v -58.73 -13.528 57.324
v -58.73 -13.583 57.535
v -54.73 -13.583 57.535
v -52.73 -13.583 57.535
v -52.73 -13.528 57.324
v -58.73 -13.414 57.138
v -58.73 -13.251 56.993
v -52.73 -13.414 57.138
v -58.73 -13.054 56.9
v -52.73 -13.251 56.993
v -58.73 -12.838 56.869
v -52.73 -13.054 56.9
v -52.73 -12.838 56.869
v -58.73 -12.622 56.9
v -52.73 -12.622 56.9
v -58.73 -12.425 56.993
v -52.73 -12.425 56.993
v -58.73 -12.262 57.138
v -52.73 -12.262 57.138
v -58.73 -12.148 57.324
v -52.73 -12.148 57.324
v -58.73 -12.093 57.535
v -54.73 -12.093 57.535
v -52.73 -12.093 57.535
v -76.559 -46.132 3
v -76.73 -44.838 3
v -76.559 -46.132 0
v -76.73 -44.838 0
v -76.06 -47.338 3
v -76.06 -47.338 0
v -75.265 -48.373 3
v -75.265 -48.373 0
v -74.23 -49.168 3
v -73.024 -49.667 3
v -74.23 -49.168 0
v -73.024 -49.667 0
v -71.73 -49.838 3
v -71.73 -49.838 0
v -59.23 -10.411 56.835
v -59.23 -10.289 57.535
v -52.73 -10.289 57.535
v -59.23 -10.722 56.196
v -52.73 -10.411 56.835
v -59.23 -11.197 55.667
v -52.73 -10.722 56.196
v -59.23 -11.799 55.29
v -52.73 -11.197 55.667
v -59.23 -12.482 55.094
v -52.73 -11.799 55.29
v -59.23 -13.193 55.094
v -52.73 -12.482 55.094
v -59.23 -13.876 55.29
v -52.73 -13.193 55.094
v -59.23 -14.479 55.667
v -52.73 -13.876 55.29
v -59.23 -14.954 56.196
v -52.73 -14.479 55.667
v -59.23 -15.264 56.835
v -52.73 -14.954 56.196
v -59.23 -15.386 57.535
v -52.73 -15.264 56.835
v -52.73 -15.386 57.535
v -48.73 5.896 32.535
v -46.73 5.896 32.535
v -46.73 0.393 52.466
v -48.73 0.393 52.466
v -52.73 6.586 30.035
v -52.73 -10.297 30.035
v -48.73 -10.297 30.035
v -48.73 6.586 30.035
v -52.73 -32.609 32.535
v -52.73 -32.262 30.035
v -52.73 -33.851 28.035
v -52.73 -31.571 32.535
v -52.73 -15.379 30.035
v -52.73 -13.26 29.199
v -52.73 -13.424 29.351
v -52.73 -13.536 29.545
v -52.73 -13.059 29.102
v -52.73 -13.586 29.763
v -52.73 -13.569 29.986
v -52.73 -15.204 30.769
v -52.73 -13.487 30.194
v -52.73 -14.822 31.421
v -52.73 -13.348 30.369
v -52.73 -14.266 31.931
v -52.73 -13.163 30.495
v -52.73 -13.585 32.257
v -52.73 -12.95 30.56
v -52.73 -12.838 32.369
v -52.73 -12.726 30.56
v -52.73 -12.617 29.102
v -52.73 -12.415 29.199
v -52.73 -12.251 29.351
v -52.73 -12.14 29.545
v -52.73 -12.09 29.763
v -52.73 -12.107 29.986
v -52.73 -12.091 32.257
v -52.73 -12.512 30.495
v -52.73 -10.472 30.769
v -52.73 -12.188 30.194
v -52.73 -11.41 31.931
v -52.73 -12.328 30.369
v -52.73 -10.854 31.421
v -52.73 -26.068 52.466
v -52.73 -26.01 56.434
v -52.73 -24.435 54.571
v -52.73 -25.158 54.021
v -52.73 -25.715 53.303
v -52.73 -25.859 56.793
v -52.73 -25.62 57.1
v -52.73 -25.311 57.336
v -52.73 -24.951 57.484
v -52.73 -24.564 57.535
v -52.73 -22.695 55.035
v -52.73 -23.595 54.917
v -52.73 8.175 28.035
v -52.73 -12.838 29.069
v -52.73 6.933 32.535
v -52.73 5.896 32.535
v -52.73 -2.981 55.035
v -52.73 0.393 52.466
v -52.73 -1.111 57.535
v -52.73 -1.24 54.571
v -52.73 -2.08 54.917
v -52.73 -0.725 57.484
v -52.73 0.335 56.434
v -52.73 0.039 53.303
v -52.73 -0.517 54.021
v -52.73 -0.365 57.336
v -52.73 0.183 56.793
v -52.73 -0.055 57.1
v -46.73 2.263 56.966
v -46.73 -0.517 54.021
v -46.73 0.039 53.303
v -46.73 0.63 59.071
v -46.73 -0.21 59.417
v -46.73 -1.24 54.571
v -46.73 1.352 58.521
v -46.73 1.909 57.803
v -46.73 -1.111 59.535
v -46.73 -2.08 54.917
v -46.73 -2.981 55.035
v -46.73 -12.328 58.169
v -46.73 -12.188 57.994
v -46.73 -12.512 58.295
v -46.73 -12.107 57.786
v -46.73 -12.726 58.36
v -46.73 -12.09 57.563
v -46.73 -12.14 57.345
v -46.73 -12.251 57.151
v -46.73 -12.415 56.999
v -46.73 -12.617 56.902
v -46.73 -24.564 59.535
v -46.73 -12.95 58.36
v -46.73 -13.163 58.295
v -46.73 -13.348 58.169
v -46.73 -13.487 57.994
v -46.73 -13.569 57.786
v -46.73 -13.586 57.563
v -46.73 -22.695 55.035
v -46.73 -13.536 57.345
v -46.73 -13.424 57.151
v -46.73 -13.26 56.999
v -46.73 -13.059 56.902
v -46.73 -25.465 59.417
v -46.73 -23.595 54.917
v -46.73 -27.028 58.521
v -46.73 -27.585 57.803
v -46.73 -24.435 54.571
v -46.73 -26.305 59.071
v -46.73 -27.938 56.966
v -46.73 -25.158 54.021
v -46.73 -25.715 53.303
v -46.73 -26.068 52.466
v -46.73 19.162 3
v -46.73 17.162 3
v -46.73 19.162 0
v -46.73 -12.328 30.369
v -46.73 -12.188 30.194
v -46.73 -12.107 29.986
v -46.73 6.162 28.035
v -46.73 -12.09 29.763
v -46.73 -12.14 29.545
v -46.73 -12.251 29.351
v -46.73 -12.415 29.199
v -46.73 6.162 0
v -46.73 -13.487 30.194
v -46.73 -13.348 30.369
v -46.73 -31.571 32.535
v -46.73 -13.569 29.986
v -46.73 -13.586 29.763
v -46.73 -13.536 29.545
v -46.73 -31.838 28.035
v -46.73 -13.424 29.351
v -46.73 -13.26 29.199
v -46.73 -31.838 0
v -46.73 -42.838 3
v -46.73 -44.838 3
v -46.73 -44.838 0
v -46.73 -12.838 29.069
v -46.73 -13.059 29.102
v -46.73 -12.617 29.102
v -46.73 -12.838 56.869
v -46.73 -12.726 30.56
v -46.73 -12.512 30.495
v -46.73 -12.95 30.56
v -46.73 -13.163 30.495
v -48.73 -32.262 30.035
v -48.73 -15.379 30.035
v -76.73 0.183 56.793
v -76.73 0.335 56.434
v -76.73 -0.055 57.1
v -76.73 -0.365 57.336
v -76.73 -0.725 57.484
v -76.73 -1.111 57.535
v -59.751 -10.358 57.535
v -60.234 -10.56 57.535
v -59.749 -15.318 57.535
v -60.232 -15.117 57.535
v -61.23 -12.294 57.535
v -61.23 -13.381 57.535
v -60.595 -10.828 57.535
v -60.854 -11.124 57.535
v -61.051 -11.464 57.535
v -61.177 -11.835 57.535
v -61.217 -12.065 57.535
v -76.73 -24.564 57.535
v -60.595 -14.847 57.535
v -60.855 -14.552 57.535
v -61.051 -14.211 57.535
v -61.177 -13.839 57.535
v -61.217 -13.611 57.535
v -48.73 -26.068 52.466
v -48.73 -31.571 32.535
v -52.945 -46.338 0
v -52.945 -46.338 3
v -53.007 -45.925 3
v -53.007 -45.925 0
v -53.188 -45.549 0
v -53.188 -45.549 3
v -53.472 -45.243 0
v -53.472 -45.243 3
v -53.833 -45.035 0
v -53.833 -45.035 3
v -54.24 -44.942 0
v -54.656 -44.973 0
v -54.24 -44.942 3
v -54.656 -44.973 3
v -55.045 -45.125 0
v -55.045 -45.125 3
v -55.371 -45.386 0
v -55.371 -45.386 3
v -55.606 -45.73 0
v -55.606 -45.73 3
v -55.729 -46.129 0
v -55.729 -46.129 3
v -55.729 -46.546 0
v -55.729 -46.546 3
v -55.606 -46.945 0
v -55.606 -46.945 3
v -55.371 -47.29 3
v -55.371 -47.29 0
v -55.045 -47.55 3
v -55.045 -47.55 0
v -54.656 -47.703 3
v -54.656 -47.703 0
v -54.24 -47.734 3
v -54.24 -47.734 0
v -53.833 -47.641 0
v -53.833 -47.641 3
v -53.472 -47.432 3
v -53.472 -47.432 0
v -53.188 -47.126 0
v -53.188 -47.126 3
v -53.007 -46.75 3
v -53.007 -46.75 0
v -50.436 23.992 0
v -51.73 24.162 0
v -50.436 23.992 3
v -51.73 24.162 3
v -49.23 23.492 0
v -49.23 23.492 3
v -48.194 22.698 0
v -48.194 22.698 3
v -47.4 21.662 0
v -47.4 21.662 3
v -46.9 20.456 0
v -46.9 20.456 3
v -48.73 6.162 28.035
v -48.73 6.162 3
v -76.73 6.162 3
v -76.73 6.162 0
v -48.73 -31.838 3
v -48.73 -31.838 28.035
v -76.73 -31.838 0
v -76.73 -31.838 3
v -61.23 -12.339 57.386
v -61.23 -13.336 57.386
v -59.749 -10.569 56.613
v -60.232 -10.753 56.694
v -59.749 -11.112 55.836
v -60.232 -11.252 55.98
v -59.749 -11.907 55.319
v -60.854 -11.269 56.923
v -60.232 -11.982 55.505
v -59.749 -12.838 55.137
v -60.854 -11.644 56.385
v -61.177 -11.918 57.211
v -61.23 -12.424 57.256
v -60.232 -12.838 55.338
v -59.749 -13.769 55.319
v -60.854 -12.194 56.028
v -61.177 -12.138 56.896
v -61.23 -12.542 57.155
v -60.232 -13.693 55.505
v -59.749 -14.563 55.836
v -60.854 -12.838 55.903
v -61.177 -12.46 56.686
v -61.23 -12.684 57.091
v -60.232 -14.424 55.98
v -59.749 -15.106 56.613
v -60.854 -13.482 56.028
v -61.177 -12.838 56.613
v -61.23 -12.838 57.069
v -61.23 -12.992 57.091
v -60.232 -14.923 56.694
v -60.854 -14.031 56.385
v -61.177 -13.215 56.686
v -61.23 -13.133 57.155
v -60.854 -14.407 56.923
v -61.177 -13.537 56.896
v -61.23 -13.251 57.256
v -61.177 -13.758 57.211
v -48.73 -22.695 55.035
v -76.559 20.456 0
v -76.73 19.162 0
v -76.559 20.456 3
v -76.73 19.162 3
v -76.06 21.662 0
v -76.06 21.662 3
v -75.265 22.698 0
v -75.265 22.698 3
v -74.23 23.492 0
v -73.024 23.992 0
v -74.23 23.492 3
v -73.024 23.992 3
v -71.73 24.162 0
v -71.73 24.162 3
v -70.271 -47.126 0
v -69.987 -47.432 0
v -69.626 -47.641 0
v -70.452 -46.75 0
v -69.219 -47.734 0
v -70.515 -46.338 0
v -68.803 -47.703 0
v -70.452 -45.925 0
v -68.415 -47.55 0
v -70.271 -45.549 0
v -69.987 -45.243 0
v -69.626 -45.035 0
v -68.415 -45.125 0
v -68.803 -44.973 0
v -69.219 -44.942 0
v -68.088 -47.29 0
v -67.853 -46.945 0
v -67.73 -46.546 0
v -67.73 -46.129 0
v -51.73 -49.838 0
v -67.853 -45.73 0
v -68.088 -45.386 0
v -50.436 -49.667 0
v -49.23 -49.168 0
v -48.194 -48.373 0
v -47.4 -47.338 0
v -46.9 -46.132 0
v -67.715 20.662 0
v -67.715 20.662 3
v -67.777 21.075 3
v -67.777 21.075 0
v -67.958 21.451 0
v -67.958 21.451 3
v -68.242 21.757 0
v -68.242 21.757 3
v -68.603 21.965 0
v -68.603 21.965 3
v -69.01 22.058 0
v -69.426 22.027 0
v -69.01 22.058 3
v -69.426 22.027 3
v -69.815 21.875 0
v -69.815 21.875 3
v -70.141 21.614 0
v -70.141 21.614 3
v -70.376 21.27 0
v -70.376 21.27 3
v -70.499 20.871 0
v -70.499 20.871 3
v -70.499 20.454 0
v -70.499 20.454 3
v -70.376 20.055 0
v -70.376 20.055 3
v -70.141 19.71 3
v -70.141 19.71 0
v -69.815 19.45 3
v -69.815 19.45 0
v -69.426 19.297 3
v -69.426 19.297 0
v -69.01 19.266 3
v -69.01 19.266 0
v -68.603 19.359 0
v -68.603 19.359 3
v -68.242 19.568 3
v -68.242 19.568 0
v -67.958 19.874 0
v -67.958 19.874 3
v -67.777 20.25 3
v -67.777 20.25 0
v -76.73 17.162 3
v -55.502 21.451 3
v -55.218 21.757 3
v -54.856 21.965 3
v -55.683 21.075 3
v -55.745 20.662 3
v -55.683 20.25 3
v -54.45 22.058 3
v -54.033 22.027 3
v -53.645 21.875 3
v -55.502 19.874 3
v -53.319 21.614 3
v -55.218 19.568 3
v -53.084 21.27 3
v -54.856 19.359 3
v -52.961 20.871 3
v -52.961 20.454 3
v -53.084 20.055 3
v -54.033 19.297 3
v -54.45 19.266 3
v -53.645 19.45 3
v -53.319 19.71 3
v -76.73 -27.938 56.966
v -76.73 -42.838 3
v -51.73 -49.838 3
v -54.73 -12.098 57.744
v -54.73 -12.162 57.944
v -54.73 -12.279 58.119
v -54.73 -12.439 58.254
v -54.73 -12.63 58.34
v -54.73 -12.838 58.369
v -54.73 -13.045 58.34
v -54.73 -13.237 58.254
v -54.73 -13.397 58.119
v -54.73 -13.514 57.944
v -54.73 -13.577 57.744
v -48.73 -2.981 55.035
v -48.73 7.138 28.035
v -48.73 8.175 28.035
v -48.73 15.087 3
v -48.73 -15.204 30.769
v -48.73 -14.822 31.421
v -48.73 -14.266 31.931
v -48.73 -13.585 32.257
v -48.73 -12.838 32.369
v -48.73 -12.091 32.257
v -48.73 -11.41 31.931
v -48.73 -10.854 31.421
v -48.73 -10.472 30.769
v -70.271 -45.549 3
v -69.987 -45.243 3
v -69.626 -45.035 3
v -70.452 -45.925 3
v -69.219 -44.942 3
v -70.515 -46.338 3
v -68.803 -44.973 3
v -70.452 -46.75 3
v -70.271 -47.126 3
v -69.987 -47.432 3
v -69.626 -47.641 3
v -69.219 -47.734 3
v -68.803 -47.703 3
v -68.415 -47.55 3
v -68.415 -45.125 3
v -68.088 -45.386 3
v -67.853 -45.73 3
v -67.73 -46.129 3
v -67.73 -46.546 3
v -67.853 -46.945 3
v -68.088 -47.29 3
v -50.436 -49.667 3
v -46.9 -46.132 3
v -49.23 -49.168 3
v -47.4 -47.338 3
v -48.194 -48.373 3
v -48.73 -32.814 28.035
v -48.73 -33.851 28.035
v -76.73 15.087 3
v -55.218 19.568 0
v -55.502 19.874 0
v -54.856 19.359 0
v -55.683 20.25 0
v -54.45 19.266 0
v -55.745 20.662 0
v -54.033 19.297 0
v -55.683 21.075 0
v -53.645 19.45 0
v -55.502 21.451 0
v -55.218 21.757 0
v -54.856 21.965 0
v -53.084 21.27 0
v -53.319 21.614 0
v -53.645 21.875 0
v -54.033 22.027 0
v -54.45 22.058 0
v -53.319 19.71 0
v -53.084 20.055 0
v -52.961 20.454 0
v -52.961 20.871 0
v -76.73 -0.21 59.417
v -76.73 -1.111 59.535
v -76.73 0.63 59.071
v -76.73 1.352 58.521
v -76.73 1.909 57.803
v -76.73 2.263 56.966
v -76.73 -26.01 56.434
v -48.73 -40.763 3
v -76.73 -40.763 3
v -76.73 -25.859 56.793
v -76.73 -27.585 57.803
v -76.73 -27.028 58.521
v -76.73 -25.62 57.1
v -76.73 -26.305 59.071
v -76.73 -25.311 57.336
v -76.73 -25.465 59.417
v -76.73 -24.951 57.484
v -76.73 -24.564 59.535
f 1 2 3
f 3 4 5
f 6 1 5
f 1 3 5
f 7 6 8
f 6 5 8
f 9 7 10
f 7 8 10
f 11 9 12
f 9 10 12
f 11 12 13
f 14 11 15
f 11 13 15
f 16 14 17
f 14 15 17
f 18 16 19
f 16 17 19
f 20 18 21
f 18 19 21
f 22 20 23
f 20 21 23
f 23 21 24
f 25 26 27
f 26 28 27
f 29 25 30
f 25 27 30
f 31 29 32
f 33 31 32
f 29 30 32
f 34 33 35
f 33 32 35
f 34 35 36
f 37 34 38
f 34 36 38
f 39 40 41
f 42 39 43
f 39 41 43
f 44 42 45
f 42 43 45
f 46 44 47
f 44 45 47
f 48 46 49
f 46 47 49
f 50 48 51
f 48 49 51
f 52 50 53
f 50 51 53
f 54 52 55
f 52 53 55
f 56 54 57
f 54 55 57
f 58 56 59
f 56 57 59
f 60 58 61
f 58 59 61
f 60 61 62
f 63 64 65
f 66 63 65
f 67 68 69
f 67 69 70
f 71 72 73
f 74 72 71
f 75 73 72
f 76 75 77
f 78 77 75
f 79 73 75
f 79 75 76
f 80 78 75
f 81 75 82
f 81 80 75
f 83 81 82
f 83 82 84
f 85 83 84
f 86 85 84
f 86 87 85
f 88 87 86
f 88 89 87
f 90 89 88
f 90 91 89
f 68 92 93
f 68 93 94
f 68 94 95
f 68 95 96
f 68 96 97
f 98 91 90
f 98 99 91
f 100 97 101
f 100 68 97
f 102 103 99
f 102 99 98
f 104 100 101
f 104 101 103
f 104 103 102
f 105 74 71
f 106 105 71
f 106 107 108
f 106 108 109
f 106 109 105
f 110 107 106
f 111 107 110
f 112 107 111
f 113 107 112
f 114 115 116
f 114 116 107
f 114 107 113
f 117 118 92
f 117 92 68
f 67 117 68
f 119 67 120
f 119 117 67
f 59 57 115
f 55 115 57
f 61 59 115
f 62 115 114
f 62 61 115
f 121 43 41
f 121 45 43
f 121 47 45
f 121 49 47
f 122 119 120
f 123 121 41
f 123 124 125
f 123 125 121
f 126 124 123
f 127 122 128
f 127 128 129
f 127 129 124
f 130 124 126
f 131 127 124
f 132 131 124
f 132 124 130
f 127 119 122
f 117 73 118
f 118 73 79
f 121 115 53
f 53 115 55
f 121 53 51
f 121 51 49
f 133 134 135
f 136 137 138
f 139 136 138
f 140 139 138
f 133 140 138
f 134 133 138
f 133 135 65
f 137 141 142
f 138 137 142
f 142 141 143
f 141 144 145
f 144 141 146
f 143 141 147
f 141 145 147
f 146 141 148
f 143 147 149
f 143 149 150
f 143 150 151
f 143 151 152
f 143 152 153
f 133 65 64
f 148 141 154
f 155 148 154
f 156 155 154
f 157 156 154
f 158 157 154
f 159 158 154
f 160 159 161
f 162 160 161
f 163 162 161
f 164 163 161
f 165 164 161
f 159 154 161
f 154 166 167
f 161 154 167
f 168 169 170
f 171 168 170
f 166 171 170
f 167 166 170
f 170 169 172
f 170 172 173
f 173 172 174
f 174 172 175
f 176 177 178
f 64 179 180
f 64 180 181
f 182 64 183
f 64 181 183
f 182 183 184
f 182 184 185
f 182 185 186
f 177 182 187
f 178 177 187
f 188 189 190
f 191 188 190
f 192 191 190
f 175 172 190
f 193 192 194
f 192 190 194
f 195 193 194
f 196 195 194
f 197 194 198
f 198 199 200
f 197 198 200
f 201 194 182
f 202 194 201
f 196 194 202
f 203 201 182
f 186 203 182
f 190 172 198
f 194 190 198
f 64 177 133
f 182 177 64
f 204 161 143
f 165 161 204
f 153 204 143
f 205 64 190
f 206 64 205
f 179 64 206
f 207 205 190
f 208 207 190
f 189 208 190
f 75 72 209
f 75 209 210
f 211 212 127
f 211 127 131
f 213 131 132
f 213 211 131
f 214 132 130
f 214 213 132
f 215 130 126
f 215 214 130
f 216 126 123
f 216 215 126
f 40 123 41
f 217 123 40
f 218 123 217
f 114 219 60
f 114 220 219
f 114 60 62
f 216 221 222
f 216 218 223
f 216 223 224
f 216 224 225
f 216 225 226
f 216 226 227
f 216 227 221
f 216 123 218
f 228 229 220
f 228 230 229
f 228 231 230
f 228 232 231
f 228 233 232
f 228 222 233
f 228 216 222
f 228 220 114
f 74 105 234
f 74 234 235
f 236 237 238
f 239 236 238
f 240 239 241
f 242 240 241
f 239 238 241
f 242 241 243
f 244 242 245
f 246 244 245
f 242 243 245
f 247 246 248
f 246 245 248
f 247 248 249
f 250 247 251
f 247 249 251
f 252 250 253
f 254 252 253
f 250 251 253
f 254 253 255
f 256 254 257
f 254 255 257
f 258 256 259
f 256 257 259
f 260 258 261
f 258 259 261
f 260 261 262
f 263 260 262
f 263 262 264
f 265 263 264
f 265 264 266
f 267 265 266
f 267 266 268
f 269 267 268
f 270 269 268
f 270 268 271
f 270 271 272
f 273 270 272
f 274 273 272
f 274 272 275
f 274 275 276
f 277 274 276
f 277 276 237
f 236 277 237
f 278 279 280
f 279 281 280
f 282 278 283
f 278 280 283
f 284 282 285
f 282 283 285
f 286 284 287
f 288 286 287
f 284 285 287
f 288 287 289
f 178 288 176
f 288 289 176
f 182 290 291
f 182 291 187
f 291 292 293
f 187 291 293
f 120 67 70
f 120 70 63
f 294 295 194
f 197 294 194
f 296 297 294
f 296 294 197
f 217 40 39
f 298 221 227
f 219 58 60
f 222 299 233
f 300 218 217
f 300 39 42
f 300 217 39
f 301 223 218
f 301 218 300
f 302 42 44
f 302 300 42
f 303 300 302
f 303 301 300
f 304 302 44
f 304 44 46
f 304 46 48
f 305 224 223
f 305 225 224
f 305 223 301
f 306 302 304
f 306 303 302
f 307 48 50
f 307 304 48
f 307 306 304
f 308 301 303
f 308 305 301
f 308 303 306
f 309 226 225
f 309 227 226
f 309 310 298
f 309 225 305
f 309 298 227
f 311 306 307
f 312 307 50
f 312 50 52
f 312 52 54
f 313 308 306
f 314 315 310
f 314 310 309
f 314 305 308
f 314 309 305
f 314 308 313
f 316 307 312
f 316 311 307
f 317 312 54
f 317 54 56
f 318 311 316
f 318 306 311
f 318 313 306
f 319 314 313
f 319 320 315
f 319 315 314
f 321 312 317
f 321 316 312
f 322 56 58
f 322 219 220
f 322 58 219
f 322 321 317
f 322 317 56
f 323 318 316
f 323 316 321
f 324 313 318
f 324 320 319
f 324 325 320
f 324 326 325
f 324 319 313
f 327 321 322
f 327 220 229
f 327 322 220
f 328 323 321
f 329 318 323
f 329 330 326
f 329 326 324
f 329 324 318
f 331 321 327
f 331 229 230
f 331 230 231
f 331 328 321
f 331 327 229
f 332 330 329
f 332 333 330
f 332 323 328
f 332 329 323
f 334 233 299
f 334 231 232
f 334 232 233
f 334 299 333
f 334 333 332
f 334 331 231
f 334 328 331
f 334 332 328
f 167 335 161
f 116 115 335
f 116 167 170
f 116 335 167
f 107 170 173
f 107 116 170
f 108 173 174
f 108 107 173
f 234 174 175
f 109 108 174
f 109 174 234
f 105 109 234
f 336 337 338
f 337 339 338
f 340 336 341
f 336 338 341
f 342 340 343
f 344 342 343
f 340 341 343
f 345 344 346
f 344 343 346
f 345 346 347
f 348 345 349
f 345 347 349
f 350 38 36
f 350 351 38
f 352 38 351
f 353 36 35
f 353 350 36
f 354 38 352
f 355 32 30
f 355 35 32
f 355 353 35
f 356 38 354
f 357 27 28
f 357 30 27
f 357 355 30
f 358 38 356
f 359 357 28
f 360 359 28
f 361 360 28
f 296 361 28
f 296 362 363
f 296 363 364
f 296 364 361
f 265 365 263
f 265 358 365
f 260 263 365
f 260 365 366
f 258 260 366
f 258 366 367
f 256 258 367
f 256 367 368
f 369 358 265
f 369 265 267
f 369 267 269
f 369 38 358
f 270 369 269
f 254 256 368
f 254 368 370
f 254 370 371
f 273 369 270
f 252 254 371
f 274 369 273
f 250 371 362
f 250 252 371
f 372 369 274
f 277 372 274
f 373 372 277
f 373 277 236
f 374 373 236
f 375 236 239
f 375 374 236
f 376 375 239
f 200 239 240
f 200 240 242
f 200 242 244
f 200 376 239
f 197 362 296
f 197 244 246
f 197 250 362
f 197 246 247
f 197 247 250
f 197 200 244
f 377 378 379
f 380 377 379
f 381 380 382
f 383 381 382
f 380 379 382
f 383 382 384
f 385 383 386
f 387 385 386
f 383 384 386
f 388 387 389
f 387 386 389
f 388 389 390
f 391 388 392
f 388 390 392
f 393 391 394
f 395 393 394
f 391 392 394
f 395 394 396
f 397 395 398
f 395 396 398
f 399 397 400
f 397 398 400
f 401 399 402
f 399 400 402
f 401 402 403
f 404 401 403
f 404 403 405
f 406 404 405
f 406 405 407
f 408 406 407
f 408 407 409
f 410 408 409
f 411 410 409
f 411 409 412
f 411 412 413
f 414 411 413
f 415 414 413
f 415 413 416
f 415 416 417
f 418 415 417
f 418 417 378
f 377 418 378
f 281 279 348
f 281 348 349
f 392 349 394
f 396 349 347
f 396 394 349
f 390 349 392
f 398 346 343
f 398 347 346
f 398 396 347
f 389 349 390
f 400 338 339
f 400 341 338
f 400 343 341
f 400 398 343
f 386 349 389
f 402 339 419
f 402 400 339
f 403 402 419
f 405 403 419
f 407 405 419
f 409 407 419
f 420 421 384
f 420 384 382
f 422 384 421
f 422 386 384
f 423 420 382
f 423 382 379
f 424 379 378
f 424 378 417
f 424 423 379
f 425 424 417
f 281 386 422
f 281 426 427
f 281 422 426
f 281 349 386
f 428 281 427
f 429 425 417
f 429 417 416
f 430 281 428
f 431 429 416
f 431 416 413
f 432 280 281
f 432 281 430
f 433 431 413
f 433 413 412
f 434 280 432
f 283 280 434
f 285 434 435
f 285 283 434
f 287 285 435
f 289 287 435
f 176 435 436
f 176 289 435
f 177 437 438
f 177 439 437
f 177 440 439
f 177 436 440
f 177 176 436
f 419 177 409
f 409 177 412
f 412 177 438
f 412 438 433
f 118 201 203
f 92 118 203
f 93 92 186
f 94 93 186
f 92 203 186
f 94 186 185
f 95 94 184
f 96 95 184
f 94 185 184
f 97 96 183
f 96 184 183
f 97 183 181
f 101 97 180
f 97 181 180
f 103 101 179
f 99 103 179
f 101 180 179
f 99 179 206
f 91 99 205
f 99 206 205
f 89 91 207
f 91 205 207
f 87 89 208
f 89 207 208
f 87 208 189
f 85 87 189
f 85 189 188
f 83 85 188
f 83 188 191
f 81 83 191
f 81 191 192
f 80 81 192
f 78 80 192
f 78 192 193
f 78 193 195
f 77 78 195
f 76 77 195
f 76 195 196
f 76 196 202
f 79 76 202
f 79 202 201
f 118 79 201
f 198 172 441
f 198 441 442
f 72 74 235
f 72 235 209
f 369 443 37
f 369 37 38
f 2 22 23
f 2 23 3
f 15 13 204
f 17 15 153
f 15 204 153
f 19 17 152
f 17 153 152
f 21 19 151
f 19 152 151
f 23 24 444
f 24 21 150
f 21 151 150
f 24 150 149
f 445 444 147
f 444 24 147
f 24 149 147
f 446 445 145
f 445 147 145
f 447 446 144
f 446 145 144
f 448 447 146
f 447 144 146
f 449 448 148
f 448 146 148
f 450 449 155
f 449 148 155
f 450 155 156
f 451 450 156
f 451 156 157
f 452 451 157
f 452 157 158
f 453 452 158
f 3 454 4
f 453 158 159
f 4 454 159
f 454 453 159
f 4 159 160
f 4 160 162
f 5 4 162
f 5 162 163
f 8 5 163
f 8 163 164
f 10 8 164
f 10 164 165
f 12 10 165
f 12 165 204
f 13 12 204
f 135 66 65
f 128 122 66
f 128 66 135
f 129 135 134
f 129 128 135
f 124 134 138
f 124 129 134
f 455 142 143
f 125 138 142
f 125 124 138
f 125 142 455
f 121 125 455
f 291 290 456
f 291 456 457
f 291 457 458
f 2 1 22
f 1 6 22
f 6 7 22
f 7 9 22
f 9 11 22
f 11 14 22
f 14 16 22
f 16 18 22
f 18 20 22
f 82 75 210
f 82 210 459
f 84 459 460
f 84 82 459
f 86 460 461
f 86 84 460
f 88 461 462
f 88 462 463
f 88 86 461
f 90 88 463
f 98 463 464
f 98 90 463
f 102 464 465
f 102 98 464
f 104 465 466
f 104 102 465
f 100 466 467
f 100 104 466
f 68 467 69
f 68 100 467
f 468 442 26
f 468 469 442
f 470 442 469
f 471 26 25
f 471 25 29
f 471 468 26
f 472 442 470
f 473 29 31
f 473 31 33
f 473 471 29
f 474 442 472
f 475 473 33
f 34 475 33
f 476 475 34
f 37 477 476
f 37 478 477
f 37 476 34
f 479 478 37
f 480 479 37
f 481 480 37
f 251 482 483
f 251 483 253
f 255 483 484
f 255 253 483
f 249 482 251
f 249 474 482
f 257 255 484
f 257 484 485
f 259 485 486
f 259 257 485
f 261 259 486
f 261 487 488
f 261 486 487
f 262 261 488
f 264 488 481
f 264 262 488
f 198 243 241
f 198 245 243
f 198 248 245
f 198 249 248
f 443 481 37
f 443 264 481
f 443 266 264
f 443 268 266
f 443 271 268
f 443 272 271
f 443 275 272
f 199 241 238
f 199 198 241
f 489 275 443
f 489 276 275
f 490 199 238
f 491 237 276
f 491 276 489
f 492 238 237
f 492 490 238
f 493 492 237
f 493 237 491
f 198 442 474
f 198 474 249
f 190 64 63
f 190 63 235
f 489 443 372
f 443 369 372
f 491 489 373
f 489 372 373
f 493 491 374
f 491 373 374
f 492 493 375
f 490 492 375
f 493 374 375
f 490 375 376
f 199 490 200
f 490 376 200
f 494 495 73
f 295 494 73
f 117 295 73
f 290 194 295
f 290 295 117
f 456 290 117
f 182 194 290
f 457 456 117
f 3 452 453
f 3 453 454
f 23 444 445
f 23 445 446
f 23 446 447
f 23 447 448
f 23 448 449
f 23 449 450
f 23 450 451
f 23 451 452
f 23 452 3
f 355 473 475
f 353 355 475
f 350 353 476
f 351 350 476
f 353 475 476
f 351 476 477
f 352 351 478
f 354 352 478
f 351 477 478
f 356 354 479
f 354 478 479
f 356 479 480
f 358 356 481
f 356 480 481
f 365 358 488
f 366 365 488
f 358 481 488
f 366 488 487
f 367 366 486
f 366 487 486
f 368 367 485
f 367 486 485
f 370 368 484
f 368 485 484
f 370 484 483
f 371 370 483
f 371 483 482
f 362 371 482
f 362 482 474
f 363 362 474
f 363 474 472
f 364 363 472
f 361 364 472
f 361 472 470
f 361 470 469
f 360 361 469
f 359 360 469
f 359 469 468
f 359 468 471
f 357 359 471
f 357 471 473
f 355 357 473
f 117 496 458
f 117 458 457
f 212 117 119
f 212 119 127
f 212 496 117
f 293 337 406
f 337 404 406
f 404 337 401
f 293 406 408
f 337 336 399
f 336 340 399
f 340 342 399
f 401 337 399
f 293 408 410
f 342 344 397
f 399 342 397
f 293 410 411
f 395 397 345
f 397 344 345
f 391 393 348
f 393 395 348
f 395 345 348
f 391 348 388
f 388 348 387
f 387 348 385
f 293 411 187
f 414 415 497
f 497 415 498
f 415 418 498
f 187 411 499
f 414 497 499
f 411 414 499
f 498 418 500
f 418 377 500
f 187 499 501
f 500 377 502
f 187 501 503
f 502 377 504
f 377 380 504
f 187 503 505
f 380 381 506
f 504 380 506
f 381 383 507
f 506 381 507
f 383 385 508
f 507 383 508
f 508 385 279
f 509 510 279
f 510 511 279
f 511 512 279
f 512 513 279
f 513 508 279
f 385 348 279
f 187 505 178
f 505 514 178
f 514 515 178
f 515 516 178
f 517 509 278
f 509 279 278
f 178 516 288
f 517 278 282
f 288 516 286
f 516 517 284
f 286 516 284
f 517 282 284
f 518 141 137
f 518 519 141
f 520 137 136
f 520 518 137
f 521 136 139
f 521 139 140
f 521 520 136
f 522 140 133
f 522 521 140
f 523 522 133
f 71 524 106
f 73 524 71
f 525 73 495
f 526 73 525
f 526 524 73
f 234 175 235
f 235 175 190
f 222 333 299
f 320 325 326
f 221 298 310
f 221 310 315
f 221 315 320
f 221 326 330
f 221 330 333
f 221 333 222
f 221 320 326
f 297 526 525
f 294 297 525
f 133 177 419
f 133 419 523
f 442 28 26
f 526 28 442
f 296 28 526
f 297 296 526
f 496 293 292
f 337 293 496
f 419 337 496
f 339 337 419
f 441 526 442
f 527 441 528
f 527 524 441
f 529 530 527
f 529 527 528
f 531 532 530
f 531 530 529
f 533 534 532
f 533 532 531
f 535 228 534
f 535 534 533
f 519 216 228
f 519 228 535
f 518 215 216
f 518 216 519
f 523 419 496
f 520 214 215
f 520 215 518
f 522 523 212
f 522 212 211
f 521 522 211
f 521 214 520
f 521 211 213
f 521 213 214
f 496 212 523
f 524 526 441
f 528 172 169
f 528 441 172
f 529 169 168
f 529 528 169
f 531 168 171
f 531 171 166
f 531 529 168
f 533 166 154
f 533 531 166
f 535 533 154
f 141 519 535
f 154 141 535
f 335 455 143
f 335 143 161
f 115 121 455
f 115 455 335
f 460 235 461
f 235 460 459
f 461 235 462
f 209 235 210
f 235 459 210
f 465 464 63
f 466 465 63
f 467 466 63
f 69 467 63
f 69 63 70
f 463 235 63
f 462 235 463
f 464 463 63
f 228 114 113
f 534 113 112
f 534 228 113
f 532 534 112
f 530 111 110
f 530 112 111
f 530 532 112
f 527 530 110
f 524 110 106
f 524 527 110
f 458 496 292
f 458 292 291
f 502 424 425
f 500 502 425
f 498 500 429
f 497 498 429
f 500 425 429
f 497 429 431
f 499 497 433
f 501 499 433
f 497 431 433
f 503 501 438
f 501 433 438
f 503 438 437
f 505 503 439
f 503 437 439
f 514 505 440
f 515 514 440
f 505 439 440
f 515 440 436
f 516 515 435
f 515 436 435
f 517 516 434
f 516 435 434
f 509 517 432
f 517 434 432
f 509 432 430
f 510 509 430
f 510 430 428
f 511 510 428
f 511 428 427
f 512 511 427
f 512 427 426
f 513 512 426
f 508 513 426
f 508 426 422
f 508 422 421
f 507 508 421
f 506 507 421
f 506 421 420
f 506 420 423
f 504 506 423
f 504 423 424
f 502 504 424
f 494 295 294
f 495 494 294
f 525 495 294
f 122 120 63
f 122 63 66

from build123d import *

# Parameters (mm, degrees)
BOSS_EXTRU_1_DEPTH      = 30
CONG_5_R                = 3.5
ESQUISSE3_R             = 1.5
ENL_V_MAT_EXTRU_1_DEPTH = 108.552111318
COQUE5_START            = -74.72972973
COQUE5_DEPTH            = 26
BOSS_EXTRU_5_DEPTH      = 4
BOSS_EXTRU_6_START      = 4
BOSS_EXTRU_6_DEPTH      = 4
ENL_V_START             = -2
ENL_V_MAT_EXTRU_5_DEPTH = 2
ESQUISSE11_W            = 30
ESQUISSE11_H            = 3
BOSS_EXTRU_8_DEPTH      = 18
NERVURE1_REACH          = 85.236
ESQUISSE12_WALL_W       = 25.034902344
ESQUISSE12_WALL_H       = 2
ESQUISSE13_R            = 0.75
ENL_V_MAT_EXTRU_6_DEPTH = 8
BOSS_EXTRU_9_DEPTH      = 6
BOSS_EXTRU_10_DEPTH     = 2.5
CONG_7_R                = 2
ENL_V_MAT_EXTRU_7_DEPTH = 4
CONG_9_R                = 5
ESQUISSE22_R            = 1.4
ENL_V_MAT_EXTRU_8_DEPTH = 108.552111389


# Read off the part's stored shape, not the designer's step: Coque5
with BuildPart() as part:
    # Esquisse2 → Boss.-Extru.1 (new body)
    with BuildSketch(Plane(origin=(-46.72972973, 0, -4), x_dir=(0, 1, 0), z_dir=(1, 0, 0))):
        Polygon((-49.837837838, 4), (-40.553869421, 4), (-32.813706623, 32.034902345), (7.138030947, 32.034902345), (14.878193746, 4), (24.162162162, 4), (24.162162162, 7), (17.162162162, 7), (1.553427739, 63.534902), (-27.229103415, 63.534902), (-42.837837838, 7), (-49.837837838, 7), align=None)
        Polygon((-31.571300562, 36.534902345), (5.895624886, 36.534902345), (-0.316405324, 59.034902), (-25.359270352, 59.034902), align=None, mode=Mode.SUBTRACT)
    extrude(amount=-BOSS_EXTRU_1_DEPTH)

    # Congé5
    cong_5_edges = [part.edges().sort_by_distance(p)[0] for p in [
        (-61.72972973, -27.229103415, 59.534902),
        (-61.72972973, 1.553427739, 59.534902),
        (-61.72972973, -25.359270352, 55.034902),
        (-61.72972973, -0.316405324, 55.034902),
    ]]
    fillet(cong_5_edges, radius=CONG_5_R)

    # Esquisse3 → Enlèv. mat.-Extru.1 (cut, through all)
    with BuildSketch(Plane.XY.offset(3)):
        with Locations((-69.22972973, 20.662162162)):
            Circle(ESQUISSE3_R)
        with Locations(Location((-54.22972973, 20.662162162, 0), (0, 0, 180))):
            Circle(ESQUISSE3_R)
        with Locations((-54.22972973, -46.337837838)):
            Circle(ESQUISSE3_R)
        with Locations(Location((-69.22972973, -46.337837838, 0), (0, 0, 180))):
            Circle(ESQUISSE3_R)
    extrude(amount=-ENL_V_MAT_EXTRU_1_DEPTH, mode=Mode.SUBTRACT)

    # Coque5 outline → Coque5 (cut)
    with BuildSketch(Plane.YZ.offset(COQUE5_START)):
        with BuildLine():
            Line((-26.010377917, 56.434102065), (-41.039101991, 2))
            Line((-41.039101991, 2), (-40.00168895, 2))
            Line((-40.00168895, 2), (-32.813706623, 28.034902345))
            Line((-32.813706623, 28.034902345), (7.138030947, 28.034902345))
            Line((7.138030947, 28.034902345), (14.326013274, 2))
            Line((14.326013274, 2), (15.363426315, 2))
            Line((15.363426315, 2), (0.334702242, 56.434102065))
            ThreePointArc((0.334702242, 56.434102065), (-0.202576772, 57.22838432), (-1.11120208, 57.534902))
            Line((-1.11120208, 57.534902), (-24.564473595, 57.534902))
            ThreePointArc((-24.564473595, 57.534902), (-25.473098904, 57.22838432), (-26.010377917, 56.434102065))
        make_face()
        with BuildLine():
            Line((-31.571300562, 32.534902345), (-26.068417283, 52.466368819))
            ThreePointArc((-26.068417283, 52.466368819), (-24.814766252, 54.319694081), (-22.694640532, 55.034902))
            Line((-22.694640532, 55.034902), (-2.981035143, 55.034902))
            ThreePointArc((-2.981035143, 55.034902), (-0.860909424, 54.319694081), (0.392741608, 52.466368819))
            Line((0.392741608, 52.466368819), (5.895624886, 32.534902345))
            Line((5.895624886, 32.534902345), (-31.571300562, 32.534902345))
        make_face(mode=Mode.SUBTRACT)
    extrude(amount=COQUE5_DEPTH, mode=Mode.SUBTRACT)

    # Esquisse6 → Boss.-Extru.5 (add)
    with BuildSketch(Plane.ZY.offset(48.72972973)):
        Polygon((32.534902345, -32.608713603), (28.034902345, -33.851119664), (28.034902345, 8.175443988), (32.534902345, 6.933037927), align=None)
    extrude(amount=BOSS_EXTRU_5_DEPTH)

    # Esquisse7 → Boss.-Extru.6 (add)
    with BuildSketch(Plane.ZY.offset(48.72972973).offset(BOSS_EXTRU_6_START)):
        with BuildLine():
            Line((57.534902, -24.564473595), (57.534902, -1.11120208))
            ThreePointArc((57.534902, -1.11120208), (57.22838432, -0.202576772), (56.434102065, 0.334702242))
            Line((56.434102065, 0.334702242), (32.534902345, 6.933037927))
            Line((32.534902345, 6.933037927), (32.534902345, 5.895624886))
            Line((32.534902345, 5.895624886), (52.466368819, 0.392741608))
            ThreePointArc((52.466368819, 0.392741608), (54.319694081, -0.860909424), (55.034902, -2.981035143))
            Line((55.034902, -2.981035143), (55.034902, -22.694640532))
            ThreePointArc((55.034902, -22.694640532), (54.319694081, -24.814766252), (52.466368819, -26.068417283))
            Line((52.466368819, -26.068417283), (32.534902345, -31.571300562))
            Line((32.534902345, -31.571300562), (32.534902345, -32.608713603))
            Line((32.534902345, -32.608713603), (56.434102065, -26.010377917))
            ThreePointArc((56.434102065, -26.010377917), (57.22838432, -25.473098904), (57.534902, -24.564473595))
        make_face()
    extrude(amount=-BOSS_EXTRU_6_DEPTH)

    # Esquisse9 → Enlèv. mat.-Extru.5 (cut)
    with BuildSketch(Plane(origin=(-74.72972973, 0, 0), x_dir=(0, 0, -1), z_dir=(1, 0, 0)).offset(ENL_V_START)):
        with BuildLine():
            Line((-2, 15.363426315), (-56.434102065, 0.334702242))
            ThreePointArc((-56.434102065, 0.334702242), (-57.22838432, -0.202576772), (-57.534902, -1.11120208))
            Line((-57.534902, -1.11120208), (-57.534902, -24.564473595))
            ThreePointArc((-57.534902, -24.564473595), (-57.22838432, -25.473098904), (-56.434102065, -26.010377917))
            Line((-56.434102065, -26.010377917), (-2, -41.039101991))
            Line((-2, -41.039101991), (-2, -40.00168895))
            Line((-2, -40.00168895), (-28.034902345, -32.813706623))
            Line((-28.034902345, -32.813706623), (-28.034902345, 7.138030947))
            Line((-28.034902345, 7.138030947), (-2, 14.326013274))
            Line((-2, 14.326013274), (-2, 15.363426315))
        make_face()
    extrude(amount=ENL_V_MAT_EXTRU_5_DEPTH, mode=Mode.SUBTRACT)

    # Esquisse11 → Boss.-Extru.8 (add)
    with BuildSketch(Plane.XZ.offset(49.837837838)):
        with Locations((-61.72972973, 1.5)):
            Rectangle(ESQUISSE11_W, ESQUISSE11_H)
    boss_extru_8 = extrude(amount=-BOSS_EXTRU_8_DEPTH)

    # Esquisse12 wall → Nervure1 (add, up to next)
    with BuildSketch(Plane(origin=(-46.72972973, -31.837837838, 15.517451172), x_dir=(0, 0, -1), z_dir=(0, 1, 0)), mode=Mode.PRIVATE) as nervure1_sk1:
        with Locations((0, 1)):
            Rectangle(ESQUISSE12_WALL_W, ESQUISSE12_WALL_H)
    nervure1_tool1 = extrude(nervure1_sk1.sketch, amount=-NERVURE1_REACH, mode=Mode.PRIVATE) - part.part
    nervure1 = nervure1_tool1.solids().sort_by_distance((-46.72972973, -31.837837838, 15.517451172))[0]
    add(nervure1)

    # Symétrie1: Boss.-Extru.8, Nervure1 across plane
    add(boss_extru_8.mirror(Plane.ZX.offset(-12.837837838)))
    add(nervure1.mirror(Plane.ZX.offset(-12.837837838)))

    # Esquisse13 → Enlèv. mat.-Extru.6 (cut)
    with BuildSketch(Plane(origin=(-46.72972973, 0, 0), x_dir=(0, 0, -1), z_dir=(1, 0, 0))):
        with Locations((-57.618809014, -12.837837838)):
            Circle(ESQUISSE13_R)
        with Locations((-29.818809014, -12.837837838)):
            Circle(ESQUISSE13_R)
    extrude(amount=-ENL_V_MAT_EXTRU_6_DEPTH, mode=Mode.SUBTRACT)

    # Esquisse15 → Boss.-Extru.9 (add)
    with BuildSketch(Plane.ZY.offset(52.72972973)):
        with BuildLine():
            Line((57.534902, -15.386456996), (57.534902, -13.583129467))
            ThreePointArc((57.534902, -13.583129467), (56.868809014, -12.837837838), (57.534902, -12.092546208))
            Line((57.534902, -12.092546208), (57.534902, -10.28921868))
            ThreePointArc((57.534902, -10.28921868), (55.068809014, -12.837837838), (57.534902, -15.386456996))
        make_face()
    extrude(amount=BOSS_EXTRU_9_DEPTH)

    # Esquisse16 → Boss.-Extru.10 (add)
    with BuildSketch(Plane.ZY.offset(58.72972973)):
        with BuildLine():
            Line((57.534902, -15.386456996), (57.534902, -10.28921868))
            ThreePointArc((57.534902, -10.28921868), (55.068809014, -12.837837838), (57.534902, -15.386456996))
        make_face()
    extrude(amount=BOSS_EXTRU_10_DEPTH)

    # Congé7
    cong_7_edges = [part.edges().sort_by_distance(p)[0] for p in [
        (-61.22972973, -12.837837838, 55.068809014),
    ]]
    fillet(cong_7_edges, radius=CONG_7_R)

    # Esquisse17 → Enlèv. mat.-Extru.7 (cut)
    with BuildSketch(Plane.ZY.offset(52.72972973)):
        with BuildLine():
            Line((30.034902345, 6.585850475), (32.534902345, 5.895624886))
            Line((32.534902345, 5.895624886), (32.534902345, -31.571300562))
            Line((32.534902345, -31.571300562), (30.034902345, -32.261526151))
            Line((30.034902345, -32.261526151), (30.034902345, -15.378665198))
            ThreePointArc((30.034902345, -15.378665198), (32.368809014, -12.837837838), (30.034902345, -10.297010478))
            Line((30.034902345, -10.297010478), (30.034902345, 6.585850475))
        make_face()
    extrude(amount=-ENL_V_MAT_EXTRU_7_DEPTH, mode=Mode.SUBTRACT)

    # Congé9
    cong_9_edges = [part.edges().sort_by_distance(p)[0] for p in [
        (-76.72972973, -49.837837838, 1.5),
        (-76.72972973, 24.162162162, 1.5),
        (-46.72972973, 24.162162162, 1.5),
        (-46.72972973, -49.837837838, 1.5),
    ]]
    fillet(cong_9_edges, radius=CONG_9_R)

    # Esquisse22 → Enlèv. mat.-Extru.8 (cut, through all)
    with BuildSketch(Plane.XY.offset(3)):
        with Locations((-69.114577733, 20.662162162)):
            Circle(ESQUISSE22_R)
        with Locations(Location((-54.344881726, 20.662162162, 0), (0, 0, 180))):
            Circle(ESQUISSE22_R)
        with Locations((-54.344881726, -46.337837838)):
            Circle(ESQUISSE22_R)
        with Locations(Location((-69.114577733, -46.337837838, 0), (0, 0, 180))):
            Circle(ESQUISSE22_R)
    extrude(amount=-ENL_V_MAT_EXTRU_8_DEPTH, mode=Mode.SUBTRACT)


solid = part.part
